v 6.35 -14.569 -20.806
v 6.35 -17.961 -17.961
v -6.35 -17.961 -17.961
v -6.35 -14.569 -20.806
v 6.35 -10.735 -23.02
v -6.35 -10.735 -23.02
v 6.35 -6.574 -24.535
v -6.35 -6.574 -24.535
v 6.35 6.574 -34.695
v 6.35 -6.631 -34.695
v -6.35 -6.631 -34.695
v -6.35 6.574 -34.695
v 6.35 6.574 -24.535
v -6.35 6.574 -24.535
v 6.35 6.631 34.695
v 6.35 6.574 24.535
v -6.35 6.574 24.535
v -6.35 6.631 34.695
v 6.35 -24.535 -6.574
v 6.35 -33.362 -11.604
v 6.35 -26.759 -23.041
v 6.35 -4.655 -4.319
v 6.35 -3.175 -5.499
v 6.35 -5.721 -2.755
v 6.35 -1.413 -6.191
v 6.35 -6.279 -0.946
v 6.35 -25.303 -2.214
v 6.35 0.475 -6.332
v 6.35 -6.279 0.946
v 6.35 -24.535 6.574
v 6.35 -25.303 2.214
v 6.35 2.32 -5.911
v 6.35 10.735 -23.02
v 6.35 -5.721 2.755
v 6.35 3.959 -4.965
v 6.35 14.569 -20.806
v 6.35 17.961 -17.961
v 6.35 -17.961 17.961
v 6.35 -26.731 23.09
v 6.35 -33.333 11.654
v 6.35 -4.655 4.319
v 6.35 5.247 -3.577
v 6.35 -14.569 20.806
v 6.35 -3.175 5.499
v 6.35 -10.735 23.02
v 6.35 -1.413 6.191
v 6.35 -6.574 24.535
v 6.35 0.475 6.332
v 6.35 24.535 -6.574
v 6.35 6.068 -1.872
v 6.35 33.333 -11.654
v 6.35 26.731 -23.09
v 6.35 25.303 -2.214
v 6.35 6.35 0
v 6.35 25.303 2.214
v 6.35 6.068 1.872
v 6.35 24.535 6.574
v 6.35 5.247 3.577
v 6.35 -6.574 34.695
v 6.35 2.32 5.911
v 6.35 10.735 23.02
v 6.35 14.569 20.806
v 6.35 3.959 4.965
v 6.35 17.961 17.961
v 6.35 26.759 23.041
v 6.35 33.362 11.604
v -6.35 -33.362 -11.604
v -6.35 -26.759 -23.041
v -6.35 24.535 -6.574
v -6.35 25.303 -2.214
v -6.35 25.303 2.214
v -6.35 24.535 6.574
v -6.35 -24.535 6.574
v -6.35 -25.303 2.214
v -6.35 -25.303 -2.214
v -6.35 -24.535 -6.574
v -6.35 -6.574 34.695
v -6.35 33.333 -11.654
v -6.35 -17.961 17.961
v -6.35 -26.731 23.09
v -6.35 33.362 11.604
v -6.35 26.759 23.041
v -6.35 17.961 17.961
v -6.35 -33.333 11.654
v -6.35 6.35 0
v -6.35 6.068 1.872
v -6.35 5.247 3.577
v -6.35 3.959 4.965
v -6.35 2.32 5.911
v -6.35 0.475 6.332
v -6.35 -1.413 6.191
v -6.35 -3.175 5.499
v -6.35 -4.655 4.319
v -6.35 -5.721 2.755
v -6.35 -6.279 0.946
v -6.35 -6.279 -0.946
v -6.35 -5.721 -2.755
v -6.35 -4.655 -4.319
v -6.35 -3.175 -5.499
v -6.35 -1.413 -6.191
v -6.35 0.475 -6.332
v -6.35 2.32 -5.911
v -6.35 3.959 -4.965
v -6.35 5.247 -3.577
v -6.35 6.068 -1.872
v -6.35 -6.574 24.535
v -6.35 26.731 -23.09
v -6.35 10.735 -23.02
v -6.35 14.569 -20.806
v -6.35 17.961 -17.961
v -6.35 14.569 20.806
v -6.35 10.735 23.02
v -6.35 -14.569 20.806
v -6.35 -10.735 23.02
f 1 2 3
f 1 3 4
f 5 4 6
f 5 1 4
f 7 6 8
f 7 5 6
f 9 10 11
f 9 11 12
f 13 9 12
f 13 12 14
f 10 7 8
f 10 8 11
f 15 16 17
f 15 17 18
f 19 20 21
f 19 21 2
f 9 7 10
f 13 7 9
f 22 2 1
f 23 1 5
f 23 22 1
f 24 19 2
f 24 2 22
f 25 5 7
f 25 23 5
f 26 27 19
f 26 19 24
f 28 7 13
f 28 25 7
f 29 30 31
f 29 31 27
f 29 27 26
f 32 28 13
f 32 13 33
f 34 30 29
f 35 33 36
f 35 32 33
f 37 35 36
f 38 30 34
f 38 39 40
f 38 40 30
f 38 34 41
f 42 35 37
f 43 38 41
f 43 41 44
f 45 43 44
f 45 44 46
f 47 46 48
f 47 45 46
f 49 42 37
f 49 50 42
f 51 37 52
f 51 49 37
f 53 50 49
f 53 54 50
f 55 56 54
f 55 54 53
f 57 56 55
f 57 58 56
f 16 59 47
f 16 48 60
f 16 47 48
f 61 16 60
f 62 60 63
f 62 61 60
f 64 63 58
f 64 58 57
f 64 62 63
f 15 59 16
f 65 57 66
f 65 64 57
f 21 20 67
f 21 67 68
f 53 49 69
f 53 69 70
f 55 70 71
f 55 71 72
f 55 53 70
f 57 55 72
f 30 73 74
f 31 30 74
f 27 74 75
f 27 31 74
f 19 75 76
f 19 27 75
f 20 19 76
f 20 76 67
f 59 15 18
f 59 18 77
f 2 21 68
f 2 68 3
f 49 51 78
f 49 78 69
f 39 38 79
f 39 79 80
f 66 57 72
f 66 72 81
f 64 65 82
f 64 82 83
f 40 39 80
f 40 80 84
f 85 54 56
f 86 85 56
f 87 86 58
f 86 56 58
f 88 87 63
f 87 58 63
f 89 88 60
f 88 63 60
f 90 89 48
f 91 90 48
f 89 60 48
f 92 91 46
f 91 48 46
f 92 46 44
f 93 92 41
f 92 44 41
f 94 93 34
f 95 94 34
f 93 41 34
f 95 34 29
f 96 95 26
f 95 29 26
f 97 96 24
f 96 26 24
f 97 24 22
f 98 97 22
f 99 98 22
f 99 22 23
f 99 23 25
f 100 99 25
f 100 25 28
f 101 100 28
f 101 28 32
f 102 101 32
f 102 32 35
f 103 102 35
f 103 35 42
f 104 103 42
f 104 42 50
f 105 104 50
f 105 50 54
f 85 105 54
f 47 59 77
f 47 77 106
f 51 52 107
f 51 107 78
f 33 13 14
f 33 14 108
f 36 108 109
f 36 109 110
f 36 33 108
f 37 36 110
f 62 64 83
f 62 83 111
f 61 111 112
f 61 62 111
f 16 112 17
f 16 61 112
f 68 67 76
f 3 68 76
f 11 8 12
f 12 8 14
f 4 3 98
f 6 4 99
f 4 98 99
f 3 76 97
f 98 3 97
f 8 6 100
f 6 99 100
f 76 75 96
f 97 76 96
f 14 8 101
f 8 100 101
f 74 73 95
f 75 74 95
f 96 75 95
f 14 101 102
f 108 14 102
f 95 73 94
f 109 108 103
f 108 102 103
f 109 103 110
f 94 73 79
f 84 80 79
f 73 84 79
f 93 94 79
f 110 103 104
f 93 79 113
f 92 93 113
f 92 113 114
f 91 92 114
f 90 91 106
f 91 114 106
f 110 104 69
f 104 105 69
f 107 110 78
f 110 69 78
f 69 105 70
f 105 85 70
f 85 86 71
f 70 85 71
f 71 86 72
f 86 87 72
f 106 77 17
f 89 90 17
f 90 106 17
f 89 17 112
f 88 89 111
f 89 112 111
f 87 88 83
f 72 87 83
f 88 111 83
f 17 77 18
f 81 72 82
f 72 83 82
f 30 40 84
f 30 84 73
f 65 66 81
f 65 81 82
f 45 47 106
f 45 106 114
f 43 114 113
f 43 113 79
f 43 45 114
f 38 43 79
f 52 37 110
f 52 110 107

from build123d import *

# Parameters (mm, degrees)
F0_R     = 25.4
F1_DEPTH = 6.35
F3_DEPTH = 12.7
F5_COUNT = 6
F6_R     = 6.35
F7_DEPTH = 25.4


with BuildPart() as f1:
    # F0 (on Right) → F1 (new body, symmetric)
    with BuildSketch(Plane.YZ):
        Circle(F0_R)
    extrude(amount=F1_DEPTH, both=True)

    # F2 (on face) → F3 (join)
    with BuildSketch(Plane.YZ.offset(6.35)):
        Polygon((-6.574004, 24.534516), (0, 0), (0, 24.534516), align=None)
        Polygon((0, 24.534516), (0, 0), (6.574004, 24.534516), align=None)
        Polygon((-6.574004, 24.534516), (0, 24.534516), (6.574004, 24.534516), (6.631173, 34.694516), (-6.574004, 34.694516), align=None)
    extrude(amount=-F3_DEPTH)

    # F5: F1 ×6 about axis
    f5_axis = Axis((-31.581827, 0, 0), (-1, 0, 0))


with BuildPart() as f1_1:
    add(f1.part)
    for i in range(1, F5_COUNT):
        add(f1.part.rotate(f5_axis, i * 360 / F5_COUNT))

    # F6 (on face) → F7 (cut)
    with BuildSketch(Plane.YZ.offset(6.35)):
        Circle(F6_R)
    extrude(amount=-F7_DEPTH, mode=Mode.SUBTRACT)


solid = f1_1.part
